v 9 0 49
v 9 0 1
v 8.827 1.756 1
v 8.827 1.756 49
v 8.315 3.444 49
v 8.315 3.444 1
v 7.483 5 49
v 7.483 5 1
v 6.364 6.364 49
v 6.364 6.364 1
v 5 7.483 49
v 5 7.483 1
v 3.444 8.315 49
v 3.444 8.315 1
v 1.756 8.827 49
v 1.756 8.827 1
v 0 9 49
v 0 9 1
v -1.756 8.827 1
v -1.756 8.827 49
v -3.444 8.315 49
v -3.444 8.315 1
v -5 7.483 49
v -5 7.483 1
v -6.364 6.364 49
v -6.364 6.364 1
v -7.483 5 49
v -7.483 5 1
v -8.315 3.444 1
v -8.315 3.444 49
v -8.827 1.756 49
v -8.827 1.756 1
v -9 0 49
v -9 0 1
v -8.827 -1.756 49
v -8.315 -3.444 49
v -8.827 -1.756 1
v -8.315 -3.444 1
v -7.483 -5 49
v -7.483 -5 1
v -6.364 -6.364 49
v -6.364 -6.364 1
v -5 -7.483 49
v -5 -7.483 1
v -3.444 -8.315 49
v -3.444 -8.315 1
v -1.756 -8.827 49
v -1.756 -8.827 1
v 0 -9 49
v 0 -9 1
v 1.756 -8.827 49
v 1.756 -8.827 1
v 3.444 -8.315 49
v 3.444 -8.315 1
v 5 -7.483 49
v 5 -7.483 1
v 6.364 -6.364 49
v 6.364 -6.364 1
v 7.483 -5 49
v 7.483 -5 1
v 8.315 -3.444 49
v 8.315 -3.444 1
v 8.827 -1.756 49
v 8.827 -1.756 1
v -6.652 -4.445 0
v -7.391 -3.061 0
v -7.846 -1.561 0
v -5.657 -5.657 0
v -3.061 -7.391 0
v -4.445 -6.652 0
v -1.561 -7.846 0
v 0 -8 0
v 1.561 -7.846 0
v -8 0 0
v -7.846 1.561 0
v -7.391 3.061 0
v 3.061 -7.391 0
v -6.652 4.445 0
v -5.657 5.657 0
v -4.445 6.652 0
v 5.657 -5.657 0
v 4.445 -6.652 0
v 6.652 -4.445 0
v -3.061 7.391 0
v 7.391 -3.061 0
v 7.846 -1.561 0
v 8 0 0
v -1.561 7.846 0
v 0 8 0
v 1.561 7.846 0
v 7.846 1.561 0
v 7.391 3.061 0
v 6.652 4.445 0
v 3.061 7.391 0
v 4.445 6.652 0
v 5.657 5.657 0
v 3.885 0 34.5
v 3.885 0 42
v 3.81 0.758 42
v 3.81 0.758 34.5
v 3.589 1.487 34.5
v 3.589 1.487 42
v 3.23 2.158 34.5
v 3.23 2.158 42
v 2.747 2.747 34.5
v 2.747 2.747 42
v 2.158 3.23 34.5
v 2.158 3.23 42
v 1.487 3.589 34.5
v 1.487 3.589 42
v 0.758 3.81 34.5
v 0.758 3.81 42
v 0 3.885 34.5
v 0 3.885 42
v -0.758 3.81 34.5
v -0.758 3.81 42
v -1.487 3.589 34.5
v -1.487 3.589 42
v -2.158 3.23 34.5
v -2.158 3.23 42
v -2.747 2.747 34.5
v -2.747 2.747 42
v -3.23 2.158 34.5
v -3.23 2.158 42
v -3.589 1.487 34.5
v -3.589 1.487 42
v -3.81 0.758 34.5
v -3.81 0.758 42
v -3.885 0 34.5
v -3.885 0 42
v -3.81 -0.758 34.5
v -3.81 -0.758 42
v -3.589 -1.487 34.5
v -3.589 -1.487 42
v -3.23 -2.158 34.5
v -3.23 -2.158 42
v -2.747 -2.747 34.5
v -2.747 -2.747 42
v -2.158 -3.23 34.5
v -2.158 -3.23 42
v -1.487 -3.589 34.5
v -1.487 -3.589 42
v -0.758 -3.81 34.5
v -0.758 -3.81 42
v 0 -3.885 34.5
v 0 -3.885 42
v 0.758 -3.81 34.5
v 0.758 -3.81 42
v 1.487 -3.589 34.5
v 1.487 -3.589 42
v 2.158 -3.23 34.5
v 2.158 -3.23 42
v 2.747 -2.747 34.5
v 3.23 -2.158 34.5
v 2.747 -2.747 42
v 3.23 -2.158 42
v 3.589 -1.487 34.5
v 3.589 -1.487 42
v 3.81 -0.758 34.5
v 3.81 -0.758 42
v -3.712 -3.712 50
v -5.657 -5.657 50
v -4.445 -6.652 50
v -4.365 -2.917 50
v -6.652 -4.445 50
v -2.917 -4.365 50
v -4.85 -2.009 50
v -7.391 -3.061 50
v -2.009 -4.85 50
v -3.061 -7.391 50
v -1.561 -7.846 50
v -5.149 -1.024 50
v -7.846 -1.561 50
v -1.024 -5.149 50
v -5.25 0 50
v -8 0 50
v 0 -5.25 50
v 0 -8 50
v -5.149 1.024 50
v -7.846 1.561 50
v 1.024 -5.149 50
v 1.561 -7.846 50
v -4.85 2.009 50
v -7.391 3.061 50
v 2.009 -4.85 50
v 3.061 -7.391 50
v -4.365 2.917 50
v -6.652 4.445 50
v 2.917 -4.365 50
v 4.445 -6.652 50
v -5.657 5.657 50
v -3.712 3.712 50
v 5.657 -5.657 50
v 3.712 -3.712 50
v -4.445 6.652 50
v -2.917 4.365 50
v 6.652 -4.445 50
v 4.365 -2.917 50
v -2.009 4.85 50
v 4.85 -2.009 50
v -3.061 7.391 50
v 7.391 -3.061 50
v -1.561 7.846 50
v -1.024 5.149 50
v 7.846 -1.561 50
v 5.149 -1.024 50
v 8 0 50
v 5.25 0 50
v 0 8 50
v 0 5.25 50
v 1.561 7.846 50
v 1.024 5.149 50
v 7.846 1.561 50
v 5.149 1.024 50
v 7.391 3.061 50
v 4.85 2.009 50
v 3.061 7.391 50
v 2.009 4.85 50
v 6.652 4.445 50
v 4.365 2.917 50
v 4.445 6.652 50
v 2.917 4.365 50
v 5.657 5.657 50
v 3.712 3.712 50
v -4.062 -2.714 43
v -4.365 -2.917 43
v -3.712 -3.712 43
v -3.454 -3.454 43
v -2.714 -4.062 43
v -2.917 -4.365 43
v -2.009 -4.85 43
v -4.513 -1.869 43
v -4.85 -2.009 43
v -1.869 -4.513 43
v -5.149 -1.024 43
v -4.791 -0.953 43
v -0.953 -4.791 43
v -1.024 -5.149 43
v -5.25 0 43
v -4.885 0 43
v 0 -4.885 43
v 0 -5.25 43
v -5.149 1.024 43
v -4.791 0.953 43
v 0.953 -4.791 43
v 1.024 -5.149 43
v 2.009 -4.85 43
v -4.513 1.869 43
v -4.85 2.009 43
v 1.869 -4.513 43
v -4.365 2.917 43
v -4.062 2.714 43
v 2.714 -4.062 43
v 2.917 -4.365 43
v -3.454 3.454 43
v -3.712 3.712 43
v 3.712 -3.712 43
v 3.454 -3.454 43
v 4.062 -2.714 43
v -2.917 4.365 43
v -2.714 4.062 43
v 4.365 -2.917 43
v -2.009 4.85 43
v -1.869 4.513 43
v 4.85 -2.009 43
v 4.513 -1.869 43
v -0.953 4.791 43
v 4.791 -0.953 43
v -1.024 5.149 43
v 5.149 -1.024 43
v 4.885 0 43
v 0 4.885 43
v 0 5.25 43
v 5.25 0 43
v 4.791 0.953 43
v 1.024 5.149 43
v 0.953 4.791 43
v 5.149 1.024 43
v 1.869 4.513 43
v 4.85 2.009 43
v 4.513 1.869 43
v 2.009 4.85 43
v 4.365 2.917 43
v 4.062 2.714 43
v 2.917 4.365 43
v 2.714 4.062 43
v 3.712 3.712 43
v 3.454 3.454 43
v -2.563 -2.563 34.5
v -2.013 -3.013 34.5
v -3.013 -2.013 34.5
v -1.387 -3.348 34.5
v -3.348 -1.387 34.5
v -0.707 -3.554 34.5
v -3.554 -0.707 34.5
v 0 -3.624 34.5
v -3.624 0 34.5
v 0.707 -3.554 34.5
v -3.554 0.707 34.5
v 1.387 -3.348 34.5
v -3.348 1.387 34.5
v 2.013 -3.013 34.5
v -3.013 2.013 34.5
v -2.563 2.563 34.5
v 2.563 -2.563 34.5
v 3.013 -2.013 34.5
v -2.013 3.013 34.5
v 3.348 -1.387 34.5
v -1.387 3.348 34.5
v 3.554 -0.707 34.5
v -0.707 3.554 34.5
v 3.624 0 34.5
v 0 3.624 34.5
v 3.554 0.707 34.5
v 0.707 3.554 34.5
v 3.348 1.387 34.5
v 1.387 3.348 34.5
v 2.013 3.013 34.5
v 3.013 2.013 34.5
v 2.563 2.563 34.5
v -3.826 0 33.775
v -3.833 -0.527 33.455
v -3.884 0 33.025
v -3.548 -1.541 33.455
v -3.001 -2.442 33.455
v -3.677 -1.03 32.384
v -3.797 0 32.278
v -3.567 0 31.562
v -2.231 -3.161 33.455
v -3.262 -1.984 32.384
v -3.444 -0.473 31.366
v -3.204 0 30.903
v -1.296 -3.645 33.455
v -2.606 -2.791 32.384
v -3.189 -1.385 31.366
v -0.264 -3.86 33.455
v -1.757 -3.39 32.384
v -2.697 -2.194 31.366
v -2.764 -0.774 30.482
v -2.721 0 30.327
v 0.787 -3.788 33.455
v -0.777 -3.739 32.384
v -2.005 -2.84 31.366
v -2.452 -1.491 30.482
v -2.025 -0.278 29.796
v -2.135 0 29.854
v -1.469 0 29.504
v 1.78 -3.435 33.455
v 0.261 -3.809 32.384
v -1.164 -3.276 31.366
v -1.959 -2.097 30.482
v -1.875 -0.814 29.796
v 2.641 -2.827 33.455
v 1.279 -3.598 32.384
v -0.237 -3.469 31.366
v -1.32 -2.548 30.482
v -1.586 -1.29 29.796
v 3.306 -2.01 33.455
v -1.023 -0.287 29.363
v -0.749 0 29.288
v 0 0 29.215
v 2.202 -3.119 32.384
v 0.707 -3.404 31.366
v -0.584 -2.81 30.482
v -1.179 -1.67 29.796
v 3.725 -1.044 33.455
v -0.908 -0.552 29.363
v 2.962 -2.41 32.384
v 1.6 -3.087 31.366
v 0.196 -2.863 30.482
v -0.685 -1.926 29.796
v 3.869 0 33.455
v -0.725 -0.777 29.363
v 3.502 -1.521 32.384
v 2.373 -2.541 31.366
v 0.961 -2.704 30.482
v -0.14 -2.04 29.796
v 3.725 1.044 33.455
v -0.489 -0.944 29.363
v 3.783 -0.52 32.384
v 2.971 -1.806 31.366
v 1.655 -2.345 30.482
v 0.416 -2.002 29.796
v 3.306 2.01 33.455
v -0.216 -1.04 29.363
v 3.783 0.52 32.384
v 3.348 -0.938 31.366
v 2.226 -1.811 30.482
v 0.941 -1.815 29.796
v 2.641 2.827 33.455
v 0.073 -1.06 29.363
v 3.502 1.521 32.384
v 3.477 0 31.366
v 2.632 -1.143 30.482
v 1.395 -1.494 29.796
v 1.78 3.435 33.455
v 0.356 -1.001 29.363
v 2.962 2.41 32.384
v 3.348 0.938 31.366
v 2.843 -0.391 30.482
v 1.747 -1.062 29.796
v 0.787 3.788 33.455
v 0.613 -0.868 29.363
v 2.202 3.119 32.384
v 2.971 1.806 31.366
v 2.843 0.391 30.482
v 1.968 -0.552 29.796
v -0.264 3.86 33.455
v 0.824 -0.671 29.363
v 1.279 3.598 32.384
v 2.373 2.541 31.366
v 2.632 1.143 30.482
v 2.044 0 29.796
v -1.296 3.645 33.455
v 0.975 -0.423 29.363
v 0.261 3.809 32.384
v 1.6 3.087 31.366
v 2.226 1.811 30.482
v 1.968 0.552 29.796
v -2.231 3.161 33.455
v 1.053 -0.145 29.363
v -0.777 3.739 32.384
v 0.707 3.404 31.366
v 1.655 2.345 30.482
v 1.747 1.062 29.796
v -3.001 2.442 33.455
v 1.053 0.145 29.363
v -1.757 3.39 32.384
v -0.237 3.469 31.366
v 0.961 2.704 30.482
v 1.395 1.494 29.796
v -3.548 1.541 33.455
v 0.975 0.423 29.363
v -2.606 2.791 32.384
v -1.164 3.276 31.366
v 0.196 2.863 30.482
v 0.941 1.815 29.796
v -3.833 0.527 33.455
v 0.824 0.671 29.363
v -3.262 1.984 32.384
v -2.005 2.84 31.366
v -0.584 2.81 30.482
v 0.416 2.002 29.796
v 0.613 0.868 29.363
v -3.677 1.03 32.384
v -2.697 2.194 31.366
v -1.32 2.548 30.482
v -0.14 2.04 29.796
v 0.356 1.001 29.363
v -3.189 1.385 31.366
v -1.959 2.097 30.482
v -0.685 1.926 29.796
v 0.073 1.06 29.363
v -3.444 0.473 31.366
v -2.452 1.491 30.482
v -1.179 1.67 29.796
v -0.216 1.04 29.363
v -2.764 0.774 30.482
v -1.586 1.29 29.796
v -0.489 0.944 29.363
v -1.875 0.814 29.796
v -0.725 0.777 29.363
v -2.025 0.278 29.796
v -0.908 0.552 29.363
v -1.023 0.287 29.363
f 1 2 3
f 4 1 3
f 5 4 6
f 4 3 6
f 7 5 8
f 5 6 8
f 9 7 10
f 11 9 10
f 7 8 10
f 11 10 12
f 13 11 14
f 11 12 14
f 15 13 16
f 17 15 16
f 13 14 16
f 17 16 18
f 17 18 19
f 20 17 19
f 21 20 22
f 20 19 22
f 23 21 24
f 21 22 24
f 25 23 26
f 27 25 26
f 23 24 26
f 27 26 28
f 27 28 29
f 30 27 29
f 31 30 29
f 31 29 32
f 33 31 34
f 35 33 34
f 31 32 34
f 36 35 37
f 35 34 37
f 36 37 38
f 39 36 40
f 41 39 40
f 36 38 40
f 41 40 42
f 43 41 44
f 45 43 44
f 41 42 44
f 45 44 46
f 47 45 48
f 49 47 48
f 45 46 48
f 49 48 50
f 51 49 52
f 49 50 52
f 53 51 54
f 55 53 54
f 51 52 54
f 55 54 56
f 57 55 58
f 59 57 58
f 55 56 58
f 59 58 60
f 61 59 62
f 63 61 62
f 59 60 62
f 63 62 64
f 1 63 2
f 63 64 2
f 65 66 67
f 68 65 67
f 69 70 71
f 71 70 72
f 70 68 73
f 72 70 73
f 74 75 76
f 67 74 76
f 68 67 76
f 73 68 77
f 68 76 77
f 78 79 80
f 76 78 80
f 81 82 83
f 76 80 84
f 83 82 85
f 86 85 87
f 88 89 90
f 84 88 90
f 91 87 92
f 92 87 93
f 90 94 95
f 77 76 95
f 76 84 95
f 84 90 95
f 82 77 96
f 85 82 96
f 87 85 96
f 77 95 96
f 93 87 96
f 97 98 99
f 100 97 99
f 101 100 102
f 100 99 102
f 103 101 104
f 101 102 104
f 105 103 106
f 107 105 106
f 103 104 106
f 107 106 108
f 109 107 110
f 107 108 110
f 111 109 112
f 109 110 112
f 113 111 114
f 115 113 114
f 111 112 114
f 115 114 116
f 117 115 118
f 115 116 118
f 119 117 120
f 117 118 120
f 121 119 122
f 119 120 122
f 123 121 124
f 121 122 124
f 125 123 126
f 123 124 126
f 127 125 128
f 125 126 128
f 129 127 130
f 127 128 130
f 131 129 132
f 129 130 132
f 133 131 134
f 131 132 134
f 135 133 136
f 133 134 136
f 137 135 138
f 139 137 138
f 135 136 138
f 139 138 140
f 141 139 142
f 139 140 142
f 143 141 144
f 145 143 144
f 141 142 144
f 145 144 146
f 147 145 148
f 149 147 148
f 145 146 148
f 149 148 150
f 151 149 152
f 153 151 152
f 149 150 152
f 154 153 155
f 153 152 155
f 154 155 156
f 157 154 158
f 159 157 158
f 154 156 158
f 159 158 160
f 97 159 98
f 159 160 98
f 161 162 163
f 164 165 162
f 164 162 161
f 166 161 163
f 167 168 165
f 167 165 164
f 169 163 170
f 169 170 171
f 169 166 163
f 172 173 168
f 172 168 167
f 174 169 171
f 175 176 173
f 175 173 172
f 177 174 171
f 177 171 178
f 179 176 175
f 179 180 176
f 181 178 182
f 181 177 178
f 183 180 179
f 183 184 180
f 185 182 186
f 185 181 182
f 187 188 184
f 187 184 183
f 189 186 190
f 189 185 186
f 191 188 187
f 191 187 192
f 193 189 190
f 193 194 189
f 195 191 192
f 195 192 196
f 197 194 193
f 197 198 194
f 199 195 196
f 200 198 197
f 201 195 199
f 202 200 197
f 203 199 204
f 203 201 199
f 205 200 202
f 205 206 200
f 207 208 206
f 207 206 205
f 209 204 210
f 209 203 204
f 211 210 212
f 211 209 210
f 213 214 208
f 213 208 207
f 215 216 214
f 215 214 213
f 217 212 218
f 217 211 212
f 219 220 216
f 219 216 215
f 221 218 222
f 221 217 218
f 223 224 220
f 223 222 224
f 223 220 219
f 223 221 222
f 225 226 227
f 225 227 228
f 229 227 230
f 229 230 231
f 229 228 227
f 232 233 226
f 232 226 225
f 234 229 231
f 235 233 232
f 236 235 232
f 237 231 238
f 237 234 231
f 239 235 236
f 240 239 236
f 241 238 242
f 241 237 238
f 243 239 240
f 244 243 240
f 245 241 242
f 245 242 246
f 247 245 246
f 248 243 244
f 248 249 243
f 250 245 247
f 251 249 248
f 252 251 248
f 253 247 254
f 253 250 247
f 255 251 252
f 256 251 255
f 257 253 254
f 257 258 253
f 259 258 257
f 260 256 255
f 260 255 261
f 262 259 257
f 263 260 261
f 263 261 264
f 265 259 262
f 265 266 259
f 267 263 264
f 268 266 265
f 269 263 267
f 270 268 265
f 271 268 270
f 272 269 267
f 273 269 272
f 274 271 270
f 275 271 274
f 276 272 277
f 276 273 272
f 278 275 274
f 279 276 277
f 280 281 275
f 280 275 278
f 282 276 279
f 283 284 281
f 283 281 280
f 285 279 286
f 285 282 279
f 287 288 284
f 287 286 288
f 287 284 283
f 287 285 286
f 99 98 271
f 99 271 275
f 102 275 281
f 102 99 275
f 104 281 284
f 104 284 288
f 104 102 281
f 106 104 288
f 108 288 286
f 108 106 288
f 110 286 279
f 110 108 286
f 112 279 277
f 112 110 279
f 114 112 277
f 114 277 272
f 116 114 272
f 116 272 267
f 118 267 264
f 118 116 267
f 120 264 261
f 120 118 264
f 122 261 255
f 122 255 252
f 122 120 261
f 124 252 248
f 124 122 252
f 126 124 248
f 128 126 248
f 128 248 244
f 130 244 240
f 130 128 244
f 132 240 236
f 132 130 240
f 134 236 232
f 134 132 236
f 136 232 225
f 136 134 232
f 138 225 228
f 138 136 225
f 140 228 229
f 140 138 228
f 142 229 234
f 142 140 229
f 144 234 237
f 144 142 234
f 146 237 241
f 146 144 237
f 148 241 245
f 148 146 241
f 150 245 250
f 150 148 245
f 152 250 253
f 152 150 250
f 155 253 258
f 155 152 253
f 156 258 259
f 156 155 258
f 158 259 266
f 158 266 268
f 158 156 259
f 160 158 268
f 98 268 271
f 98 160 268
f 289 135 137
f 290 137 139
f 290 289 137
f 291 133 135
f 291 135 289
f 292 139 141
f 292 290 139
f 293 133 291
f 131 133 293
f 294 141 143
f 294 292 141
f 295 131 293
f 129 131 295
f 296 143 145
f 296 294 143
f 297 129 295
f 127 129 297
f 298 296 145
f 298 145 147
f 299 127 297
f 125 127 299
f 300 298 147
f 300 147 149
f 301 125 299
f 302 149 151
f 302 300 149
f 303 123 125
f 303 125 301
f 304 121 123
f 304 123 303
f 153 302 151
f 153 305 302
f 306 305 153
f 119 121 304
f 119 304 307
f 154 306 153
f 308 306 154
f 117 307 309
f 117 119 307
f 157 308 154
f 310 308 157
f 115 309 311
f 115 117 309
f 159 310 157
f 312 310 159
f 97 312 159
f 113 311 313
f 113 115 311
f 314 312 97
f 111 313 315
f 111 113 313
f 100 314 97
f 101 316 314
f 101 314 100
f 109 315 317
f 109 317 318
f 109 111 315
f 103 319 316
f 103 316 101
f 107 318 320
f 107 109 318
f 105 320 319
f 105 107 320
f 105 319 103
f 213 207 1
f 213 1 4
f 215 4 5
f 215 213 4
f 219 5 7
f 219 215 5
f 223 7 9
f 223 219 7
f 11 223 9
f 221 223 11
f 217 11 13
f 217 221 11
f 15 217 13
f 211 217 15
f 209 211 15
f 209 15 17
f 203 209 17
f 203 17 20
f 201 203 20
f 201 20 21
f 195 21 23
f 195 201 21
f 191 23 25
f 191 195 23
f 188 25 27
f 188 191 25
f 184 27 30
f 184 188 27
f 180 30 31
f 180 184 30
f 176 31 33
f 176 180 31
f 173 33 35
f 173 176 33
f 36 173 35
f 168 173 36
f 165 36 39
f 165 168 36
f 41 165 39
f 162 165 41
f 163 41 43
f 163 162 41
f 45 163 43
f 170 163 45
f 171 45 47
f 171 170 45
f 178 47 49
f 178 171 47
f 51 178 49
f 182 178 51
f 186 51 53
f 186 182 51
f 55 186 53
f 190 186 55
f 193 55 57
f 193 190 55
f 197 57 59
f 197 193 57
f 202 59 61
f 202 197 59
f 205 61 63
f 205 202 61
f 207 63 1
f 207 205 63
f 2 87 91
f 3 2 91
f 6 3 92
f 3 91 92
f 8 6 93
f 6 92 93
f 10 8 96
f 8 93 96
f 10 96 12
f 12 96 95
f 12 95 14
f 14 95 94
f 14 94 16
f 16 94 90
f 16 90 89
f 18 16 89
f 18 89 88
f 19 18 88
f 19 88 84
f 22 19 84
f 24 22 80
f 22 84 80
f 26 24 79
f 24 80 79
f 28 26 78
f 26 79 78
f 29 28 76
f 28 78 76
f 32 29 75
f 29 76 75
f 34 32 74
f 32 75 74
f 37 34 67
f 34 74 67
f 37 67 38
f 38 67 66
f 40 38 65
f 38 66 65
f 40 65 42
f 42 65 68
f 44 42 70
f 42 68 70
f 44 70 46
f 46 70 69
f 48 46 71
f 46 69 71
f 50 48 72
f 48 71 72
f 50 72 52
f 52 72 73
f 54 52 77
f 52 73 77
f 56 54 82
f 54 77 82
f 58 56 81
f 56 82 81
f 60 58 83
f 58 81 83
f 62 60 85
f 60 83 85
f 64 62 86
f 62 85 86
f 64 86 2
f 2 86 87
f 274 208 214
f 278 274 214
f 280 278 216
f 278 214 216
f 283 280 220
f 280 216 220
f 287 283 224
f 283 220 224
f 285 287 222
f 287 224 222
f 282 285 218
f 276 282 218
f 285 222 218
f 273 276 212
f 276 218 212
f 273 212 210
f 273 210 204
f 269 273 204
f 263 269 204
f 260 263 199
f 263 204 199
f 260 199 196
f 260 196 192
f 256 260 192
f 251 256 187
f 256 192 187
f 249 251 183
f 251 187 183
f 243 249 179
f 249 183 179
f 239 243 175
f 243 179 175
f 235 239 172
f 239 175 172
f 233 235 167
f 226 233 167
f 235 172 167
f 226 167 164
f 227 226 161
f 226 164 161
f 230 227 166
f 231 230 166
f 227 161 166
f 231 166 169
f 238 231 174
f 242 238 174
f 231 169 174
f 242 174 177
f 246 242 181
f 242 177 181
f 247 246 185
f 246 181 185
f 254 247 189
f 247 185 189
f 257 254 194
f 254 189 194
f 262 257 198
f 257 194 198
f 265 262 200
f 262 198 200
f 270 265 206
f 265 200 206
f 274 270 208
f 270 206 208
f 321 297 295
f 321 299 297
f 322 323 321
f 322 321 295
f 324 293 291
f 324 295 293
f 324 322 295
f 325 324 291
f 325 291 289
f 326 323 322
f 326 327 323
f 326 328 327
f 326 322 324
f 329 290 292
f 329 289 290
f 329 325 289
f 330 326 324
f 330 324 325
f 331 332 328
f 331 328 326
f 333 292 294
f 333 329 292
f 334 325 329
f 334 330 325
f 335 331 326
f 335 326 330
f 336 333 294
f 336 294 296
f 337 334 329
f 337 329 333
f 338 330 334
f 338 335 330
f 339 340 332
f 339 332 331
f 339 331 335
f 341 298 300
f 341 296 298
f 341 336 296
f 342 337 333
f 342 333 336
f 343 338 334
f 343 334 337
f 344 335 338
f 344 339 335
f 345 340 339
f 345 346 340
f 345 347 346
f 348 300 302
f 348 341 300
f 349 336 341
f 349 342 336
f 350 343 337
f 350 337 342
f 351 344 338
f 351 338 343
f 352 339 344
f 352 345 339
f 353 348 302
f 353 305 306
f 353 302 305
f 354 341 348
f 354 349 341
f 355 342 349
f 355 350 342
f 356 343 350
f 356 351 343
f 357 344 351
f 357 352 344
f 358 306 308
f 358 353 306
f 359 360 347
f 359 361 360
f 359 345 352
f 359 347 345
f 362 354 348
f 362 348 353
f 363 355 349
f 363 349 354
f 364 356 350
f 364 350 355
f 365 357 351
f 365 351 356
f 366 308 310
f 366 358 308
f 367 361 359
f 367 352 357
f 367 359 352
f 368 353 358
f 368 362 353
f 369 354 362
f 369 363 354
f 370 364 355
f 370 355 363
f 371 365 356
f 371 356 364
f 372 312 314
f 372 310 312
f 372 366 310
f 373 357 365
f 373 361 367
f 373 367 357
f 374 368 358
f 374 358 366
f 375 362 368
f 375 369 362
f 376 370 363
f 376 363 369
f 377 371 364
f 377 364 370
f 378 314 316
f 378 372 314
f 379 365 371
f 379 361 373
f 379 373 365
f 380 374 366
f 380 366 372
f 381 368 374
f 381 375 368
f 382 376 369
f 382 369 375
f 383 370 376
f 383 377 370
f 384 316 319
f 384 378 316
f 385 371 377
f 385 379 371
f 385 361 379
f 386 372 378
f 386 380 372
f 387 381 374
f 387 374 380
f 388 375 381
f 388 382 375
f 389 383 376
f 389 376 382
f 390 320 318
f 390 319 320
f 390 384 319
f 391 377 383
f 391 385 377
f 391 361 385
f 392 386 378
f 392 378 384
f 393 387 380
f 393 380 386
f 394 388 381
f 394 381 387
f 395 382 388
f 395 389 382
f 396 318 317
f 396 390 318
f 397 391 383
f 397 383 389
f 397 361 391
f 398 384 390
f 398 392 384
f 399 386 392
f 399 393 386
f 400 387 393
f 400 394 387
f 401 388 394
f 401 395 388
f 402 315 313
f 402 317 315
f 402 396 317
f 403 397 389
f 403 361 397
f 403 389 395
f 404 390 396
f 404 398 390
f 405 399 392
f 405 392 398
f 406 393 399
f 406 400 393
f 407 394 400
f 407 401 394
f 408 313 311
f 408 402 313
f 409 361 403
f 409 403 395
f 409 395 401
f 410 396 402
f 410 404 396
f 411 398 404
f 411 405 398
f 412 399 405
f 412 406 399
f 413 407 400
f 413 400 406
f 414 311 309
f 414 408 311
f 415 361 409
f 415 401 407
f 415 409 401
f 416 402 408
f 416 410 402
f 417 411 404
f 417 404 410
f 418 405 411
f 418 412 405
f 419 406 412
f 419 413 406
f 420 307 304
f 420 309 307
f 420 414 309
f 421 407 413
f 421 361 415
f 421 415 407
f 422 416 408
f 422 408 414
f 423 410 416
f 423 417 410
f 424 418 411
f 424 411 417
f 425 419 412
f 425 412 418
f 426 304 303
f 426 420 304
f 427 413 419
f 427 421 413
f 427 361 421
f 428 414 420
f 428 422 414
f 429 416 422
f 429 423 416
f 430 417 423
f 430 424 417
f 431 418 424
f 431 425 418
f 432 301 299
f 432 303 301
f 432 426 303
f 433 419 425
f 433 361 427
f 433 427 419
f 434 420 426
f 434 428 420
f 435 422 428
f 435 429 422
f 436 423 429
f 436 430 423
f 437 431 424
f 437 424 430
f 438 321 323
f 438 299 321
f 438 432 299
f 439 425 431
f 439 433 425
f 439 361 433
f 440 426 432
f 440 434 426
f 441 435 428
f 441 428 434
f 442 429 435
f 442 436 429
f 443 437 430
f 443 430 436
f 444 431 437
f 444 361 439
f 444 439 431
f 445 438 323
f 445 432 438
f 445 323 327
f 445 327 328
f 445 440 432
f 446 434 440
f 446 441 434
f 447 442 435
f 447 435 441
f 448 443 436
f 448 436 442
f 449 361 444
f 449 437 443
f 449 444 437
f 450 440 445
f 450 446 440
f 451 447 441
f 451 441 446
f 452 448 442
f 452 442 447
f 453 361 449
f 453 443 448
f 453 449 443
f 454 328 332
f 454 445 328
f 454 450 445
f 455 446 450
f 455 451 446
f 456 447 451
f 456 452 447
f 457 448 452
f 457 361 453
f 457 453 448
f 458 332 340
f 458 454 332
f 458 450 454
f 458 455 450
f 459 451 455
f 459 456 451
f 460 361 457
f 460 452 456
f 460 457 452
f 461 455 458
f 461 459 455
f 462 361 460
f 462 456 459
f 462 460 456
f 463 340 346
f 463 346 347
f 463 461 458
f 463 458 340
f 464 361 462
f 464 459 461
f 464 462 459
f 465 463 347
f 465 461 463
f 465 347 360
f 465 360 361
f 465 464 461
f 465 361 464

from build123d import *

# Parameters (mm, degrees)
F2_R     = 9
F3_DEPTH = 50
F4_R     = 5.25
F5_DEPTH = 7
F6_R     = 3.885
F7_DEPTH = 8.5
F10_SIZE = 1


with BuildPart() as f3:
    # F2 (on Top) → F3 (new body)
    with BuildSketch(Plane.XY):
        Circle(F2_R)
    extrude(amount=F3_DEPTH)

    # F4 (on face) → F5 (cut)
    with BuildSketch(Plane.XY.offset(50)):
        Circle(F4_R)
    extrude(amount=-F5_DEPTH, mode=Mode.SUBTRACT)

    # F6 (on face) → F7 (cut)
    with BuildSketch(Plane.XY.offset(43)):
        Circle(F6_R)
    extrude(amount=-F7_DEPTH, mode=Mode.SUBTRACT)

    # F8 (on Front) → F9 (revolve, cut)
    with BuildSketch(Plane.XZ):
        with BuildLine():
            ThreePointArc((0, 36.985), (-3.885, 33.1), (0, 29.215))
            Line((0, 29.215), (0, 36.985))
        make_face()
    revolve(axis=Axis((0, 0, 33.1), (0, 0, 1)), mode=Mode.SUBTRACT)

    # F10
    f10_edges = [f3.edges().sort_by_distance(p)[0] for p in [
        (-3.885, 0, 43),
        (-9, 0, 50),
        (-9, 0, 0),
    ]]
    chamfer(f10_edges, length=F10_SIZE)


solid = f3.part
